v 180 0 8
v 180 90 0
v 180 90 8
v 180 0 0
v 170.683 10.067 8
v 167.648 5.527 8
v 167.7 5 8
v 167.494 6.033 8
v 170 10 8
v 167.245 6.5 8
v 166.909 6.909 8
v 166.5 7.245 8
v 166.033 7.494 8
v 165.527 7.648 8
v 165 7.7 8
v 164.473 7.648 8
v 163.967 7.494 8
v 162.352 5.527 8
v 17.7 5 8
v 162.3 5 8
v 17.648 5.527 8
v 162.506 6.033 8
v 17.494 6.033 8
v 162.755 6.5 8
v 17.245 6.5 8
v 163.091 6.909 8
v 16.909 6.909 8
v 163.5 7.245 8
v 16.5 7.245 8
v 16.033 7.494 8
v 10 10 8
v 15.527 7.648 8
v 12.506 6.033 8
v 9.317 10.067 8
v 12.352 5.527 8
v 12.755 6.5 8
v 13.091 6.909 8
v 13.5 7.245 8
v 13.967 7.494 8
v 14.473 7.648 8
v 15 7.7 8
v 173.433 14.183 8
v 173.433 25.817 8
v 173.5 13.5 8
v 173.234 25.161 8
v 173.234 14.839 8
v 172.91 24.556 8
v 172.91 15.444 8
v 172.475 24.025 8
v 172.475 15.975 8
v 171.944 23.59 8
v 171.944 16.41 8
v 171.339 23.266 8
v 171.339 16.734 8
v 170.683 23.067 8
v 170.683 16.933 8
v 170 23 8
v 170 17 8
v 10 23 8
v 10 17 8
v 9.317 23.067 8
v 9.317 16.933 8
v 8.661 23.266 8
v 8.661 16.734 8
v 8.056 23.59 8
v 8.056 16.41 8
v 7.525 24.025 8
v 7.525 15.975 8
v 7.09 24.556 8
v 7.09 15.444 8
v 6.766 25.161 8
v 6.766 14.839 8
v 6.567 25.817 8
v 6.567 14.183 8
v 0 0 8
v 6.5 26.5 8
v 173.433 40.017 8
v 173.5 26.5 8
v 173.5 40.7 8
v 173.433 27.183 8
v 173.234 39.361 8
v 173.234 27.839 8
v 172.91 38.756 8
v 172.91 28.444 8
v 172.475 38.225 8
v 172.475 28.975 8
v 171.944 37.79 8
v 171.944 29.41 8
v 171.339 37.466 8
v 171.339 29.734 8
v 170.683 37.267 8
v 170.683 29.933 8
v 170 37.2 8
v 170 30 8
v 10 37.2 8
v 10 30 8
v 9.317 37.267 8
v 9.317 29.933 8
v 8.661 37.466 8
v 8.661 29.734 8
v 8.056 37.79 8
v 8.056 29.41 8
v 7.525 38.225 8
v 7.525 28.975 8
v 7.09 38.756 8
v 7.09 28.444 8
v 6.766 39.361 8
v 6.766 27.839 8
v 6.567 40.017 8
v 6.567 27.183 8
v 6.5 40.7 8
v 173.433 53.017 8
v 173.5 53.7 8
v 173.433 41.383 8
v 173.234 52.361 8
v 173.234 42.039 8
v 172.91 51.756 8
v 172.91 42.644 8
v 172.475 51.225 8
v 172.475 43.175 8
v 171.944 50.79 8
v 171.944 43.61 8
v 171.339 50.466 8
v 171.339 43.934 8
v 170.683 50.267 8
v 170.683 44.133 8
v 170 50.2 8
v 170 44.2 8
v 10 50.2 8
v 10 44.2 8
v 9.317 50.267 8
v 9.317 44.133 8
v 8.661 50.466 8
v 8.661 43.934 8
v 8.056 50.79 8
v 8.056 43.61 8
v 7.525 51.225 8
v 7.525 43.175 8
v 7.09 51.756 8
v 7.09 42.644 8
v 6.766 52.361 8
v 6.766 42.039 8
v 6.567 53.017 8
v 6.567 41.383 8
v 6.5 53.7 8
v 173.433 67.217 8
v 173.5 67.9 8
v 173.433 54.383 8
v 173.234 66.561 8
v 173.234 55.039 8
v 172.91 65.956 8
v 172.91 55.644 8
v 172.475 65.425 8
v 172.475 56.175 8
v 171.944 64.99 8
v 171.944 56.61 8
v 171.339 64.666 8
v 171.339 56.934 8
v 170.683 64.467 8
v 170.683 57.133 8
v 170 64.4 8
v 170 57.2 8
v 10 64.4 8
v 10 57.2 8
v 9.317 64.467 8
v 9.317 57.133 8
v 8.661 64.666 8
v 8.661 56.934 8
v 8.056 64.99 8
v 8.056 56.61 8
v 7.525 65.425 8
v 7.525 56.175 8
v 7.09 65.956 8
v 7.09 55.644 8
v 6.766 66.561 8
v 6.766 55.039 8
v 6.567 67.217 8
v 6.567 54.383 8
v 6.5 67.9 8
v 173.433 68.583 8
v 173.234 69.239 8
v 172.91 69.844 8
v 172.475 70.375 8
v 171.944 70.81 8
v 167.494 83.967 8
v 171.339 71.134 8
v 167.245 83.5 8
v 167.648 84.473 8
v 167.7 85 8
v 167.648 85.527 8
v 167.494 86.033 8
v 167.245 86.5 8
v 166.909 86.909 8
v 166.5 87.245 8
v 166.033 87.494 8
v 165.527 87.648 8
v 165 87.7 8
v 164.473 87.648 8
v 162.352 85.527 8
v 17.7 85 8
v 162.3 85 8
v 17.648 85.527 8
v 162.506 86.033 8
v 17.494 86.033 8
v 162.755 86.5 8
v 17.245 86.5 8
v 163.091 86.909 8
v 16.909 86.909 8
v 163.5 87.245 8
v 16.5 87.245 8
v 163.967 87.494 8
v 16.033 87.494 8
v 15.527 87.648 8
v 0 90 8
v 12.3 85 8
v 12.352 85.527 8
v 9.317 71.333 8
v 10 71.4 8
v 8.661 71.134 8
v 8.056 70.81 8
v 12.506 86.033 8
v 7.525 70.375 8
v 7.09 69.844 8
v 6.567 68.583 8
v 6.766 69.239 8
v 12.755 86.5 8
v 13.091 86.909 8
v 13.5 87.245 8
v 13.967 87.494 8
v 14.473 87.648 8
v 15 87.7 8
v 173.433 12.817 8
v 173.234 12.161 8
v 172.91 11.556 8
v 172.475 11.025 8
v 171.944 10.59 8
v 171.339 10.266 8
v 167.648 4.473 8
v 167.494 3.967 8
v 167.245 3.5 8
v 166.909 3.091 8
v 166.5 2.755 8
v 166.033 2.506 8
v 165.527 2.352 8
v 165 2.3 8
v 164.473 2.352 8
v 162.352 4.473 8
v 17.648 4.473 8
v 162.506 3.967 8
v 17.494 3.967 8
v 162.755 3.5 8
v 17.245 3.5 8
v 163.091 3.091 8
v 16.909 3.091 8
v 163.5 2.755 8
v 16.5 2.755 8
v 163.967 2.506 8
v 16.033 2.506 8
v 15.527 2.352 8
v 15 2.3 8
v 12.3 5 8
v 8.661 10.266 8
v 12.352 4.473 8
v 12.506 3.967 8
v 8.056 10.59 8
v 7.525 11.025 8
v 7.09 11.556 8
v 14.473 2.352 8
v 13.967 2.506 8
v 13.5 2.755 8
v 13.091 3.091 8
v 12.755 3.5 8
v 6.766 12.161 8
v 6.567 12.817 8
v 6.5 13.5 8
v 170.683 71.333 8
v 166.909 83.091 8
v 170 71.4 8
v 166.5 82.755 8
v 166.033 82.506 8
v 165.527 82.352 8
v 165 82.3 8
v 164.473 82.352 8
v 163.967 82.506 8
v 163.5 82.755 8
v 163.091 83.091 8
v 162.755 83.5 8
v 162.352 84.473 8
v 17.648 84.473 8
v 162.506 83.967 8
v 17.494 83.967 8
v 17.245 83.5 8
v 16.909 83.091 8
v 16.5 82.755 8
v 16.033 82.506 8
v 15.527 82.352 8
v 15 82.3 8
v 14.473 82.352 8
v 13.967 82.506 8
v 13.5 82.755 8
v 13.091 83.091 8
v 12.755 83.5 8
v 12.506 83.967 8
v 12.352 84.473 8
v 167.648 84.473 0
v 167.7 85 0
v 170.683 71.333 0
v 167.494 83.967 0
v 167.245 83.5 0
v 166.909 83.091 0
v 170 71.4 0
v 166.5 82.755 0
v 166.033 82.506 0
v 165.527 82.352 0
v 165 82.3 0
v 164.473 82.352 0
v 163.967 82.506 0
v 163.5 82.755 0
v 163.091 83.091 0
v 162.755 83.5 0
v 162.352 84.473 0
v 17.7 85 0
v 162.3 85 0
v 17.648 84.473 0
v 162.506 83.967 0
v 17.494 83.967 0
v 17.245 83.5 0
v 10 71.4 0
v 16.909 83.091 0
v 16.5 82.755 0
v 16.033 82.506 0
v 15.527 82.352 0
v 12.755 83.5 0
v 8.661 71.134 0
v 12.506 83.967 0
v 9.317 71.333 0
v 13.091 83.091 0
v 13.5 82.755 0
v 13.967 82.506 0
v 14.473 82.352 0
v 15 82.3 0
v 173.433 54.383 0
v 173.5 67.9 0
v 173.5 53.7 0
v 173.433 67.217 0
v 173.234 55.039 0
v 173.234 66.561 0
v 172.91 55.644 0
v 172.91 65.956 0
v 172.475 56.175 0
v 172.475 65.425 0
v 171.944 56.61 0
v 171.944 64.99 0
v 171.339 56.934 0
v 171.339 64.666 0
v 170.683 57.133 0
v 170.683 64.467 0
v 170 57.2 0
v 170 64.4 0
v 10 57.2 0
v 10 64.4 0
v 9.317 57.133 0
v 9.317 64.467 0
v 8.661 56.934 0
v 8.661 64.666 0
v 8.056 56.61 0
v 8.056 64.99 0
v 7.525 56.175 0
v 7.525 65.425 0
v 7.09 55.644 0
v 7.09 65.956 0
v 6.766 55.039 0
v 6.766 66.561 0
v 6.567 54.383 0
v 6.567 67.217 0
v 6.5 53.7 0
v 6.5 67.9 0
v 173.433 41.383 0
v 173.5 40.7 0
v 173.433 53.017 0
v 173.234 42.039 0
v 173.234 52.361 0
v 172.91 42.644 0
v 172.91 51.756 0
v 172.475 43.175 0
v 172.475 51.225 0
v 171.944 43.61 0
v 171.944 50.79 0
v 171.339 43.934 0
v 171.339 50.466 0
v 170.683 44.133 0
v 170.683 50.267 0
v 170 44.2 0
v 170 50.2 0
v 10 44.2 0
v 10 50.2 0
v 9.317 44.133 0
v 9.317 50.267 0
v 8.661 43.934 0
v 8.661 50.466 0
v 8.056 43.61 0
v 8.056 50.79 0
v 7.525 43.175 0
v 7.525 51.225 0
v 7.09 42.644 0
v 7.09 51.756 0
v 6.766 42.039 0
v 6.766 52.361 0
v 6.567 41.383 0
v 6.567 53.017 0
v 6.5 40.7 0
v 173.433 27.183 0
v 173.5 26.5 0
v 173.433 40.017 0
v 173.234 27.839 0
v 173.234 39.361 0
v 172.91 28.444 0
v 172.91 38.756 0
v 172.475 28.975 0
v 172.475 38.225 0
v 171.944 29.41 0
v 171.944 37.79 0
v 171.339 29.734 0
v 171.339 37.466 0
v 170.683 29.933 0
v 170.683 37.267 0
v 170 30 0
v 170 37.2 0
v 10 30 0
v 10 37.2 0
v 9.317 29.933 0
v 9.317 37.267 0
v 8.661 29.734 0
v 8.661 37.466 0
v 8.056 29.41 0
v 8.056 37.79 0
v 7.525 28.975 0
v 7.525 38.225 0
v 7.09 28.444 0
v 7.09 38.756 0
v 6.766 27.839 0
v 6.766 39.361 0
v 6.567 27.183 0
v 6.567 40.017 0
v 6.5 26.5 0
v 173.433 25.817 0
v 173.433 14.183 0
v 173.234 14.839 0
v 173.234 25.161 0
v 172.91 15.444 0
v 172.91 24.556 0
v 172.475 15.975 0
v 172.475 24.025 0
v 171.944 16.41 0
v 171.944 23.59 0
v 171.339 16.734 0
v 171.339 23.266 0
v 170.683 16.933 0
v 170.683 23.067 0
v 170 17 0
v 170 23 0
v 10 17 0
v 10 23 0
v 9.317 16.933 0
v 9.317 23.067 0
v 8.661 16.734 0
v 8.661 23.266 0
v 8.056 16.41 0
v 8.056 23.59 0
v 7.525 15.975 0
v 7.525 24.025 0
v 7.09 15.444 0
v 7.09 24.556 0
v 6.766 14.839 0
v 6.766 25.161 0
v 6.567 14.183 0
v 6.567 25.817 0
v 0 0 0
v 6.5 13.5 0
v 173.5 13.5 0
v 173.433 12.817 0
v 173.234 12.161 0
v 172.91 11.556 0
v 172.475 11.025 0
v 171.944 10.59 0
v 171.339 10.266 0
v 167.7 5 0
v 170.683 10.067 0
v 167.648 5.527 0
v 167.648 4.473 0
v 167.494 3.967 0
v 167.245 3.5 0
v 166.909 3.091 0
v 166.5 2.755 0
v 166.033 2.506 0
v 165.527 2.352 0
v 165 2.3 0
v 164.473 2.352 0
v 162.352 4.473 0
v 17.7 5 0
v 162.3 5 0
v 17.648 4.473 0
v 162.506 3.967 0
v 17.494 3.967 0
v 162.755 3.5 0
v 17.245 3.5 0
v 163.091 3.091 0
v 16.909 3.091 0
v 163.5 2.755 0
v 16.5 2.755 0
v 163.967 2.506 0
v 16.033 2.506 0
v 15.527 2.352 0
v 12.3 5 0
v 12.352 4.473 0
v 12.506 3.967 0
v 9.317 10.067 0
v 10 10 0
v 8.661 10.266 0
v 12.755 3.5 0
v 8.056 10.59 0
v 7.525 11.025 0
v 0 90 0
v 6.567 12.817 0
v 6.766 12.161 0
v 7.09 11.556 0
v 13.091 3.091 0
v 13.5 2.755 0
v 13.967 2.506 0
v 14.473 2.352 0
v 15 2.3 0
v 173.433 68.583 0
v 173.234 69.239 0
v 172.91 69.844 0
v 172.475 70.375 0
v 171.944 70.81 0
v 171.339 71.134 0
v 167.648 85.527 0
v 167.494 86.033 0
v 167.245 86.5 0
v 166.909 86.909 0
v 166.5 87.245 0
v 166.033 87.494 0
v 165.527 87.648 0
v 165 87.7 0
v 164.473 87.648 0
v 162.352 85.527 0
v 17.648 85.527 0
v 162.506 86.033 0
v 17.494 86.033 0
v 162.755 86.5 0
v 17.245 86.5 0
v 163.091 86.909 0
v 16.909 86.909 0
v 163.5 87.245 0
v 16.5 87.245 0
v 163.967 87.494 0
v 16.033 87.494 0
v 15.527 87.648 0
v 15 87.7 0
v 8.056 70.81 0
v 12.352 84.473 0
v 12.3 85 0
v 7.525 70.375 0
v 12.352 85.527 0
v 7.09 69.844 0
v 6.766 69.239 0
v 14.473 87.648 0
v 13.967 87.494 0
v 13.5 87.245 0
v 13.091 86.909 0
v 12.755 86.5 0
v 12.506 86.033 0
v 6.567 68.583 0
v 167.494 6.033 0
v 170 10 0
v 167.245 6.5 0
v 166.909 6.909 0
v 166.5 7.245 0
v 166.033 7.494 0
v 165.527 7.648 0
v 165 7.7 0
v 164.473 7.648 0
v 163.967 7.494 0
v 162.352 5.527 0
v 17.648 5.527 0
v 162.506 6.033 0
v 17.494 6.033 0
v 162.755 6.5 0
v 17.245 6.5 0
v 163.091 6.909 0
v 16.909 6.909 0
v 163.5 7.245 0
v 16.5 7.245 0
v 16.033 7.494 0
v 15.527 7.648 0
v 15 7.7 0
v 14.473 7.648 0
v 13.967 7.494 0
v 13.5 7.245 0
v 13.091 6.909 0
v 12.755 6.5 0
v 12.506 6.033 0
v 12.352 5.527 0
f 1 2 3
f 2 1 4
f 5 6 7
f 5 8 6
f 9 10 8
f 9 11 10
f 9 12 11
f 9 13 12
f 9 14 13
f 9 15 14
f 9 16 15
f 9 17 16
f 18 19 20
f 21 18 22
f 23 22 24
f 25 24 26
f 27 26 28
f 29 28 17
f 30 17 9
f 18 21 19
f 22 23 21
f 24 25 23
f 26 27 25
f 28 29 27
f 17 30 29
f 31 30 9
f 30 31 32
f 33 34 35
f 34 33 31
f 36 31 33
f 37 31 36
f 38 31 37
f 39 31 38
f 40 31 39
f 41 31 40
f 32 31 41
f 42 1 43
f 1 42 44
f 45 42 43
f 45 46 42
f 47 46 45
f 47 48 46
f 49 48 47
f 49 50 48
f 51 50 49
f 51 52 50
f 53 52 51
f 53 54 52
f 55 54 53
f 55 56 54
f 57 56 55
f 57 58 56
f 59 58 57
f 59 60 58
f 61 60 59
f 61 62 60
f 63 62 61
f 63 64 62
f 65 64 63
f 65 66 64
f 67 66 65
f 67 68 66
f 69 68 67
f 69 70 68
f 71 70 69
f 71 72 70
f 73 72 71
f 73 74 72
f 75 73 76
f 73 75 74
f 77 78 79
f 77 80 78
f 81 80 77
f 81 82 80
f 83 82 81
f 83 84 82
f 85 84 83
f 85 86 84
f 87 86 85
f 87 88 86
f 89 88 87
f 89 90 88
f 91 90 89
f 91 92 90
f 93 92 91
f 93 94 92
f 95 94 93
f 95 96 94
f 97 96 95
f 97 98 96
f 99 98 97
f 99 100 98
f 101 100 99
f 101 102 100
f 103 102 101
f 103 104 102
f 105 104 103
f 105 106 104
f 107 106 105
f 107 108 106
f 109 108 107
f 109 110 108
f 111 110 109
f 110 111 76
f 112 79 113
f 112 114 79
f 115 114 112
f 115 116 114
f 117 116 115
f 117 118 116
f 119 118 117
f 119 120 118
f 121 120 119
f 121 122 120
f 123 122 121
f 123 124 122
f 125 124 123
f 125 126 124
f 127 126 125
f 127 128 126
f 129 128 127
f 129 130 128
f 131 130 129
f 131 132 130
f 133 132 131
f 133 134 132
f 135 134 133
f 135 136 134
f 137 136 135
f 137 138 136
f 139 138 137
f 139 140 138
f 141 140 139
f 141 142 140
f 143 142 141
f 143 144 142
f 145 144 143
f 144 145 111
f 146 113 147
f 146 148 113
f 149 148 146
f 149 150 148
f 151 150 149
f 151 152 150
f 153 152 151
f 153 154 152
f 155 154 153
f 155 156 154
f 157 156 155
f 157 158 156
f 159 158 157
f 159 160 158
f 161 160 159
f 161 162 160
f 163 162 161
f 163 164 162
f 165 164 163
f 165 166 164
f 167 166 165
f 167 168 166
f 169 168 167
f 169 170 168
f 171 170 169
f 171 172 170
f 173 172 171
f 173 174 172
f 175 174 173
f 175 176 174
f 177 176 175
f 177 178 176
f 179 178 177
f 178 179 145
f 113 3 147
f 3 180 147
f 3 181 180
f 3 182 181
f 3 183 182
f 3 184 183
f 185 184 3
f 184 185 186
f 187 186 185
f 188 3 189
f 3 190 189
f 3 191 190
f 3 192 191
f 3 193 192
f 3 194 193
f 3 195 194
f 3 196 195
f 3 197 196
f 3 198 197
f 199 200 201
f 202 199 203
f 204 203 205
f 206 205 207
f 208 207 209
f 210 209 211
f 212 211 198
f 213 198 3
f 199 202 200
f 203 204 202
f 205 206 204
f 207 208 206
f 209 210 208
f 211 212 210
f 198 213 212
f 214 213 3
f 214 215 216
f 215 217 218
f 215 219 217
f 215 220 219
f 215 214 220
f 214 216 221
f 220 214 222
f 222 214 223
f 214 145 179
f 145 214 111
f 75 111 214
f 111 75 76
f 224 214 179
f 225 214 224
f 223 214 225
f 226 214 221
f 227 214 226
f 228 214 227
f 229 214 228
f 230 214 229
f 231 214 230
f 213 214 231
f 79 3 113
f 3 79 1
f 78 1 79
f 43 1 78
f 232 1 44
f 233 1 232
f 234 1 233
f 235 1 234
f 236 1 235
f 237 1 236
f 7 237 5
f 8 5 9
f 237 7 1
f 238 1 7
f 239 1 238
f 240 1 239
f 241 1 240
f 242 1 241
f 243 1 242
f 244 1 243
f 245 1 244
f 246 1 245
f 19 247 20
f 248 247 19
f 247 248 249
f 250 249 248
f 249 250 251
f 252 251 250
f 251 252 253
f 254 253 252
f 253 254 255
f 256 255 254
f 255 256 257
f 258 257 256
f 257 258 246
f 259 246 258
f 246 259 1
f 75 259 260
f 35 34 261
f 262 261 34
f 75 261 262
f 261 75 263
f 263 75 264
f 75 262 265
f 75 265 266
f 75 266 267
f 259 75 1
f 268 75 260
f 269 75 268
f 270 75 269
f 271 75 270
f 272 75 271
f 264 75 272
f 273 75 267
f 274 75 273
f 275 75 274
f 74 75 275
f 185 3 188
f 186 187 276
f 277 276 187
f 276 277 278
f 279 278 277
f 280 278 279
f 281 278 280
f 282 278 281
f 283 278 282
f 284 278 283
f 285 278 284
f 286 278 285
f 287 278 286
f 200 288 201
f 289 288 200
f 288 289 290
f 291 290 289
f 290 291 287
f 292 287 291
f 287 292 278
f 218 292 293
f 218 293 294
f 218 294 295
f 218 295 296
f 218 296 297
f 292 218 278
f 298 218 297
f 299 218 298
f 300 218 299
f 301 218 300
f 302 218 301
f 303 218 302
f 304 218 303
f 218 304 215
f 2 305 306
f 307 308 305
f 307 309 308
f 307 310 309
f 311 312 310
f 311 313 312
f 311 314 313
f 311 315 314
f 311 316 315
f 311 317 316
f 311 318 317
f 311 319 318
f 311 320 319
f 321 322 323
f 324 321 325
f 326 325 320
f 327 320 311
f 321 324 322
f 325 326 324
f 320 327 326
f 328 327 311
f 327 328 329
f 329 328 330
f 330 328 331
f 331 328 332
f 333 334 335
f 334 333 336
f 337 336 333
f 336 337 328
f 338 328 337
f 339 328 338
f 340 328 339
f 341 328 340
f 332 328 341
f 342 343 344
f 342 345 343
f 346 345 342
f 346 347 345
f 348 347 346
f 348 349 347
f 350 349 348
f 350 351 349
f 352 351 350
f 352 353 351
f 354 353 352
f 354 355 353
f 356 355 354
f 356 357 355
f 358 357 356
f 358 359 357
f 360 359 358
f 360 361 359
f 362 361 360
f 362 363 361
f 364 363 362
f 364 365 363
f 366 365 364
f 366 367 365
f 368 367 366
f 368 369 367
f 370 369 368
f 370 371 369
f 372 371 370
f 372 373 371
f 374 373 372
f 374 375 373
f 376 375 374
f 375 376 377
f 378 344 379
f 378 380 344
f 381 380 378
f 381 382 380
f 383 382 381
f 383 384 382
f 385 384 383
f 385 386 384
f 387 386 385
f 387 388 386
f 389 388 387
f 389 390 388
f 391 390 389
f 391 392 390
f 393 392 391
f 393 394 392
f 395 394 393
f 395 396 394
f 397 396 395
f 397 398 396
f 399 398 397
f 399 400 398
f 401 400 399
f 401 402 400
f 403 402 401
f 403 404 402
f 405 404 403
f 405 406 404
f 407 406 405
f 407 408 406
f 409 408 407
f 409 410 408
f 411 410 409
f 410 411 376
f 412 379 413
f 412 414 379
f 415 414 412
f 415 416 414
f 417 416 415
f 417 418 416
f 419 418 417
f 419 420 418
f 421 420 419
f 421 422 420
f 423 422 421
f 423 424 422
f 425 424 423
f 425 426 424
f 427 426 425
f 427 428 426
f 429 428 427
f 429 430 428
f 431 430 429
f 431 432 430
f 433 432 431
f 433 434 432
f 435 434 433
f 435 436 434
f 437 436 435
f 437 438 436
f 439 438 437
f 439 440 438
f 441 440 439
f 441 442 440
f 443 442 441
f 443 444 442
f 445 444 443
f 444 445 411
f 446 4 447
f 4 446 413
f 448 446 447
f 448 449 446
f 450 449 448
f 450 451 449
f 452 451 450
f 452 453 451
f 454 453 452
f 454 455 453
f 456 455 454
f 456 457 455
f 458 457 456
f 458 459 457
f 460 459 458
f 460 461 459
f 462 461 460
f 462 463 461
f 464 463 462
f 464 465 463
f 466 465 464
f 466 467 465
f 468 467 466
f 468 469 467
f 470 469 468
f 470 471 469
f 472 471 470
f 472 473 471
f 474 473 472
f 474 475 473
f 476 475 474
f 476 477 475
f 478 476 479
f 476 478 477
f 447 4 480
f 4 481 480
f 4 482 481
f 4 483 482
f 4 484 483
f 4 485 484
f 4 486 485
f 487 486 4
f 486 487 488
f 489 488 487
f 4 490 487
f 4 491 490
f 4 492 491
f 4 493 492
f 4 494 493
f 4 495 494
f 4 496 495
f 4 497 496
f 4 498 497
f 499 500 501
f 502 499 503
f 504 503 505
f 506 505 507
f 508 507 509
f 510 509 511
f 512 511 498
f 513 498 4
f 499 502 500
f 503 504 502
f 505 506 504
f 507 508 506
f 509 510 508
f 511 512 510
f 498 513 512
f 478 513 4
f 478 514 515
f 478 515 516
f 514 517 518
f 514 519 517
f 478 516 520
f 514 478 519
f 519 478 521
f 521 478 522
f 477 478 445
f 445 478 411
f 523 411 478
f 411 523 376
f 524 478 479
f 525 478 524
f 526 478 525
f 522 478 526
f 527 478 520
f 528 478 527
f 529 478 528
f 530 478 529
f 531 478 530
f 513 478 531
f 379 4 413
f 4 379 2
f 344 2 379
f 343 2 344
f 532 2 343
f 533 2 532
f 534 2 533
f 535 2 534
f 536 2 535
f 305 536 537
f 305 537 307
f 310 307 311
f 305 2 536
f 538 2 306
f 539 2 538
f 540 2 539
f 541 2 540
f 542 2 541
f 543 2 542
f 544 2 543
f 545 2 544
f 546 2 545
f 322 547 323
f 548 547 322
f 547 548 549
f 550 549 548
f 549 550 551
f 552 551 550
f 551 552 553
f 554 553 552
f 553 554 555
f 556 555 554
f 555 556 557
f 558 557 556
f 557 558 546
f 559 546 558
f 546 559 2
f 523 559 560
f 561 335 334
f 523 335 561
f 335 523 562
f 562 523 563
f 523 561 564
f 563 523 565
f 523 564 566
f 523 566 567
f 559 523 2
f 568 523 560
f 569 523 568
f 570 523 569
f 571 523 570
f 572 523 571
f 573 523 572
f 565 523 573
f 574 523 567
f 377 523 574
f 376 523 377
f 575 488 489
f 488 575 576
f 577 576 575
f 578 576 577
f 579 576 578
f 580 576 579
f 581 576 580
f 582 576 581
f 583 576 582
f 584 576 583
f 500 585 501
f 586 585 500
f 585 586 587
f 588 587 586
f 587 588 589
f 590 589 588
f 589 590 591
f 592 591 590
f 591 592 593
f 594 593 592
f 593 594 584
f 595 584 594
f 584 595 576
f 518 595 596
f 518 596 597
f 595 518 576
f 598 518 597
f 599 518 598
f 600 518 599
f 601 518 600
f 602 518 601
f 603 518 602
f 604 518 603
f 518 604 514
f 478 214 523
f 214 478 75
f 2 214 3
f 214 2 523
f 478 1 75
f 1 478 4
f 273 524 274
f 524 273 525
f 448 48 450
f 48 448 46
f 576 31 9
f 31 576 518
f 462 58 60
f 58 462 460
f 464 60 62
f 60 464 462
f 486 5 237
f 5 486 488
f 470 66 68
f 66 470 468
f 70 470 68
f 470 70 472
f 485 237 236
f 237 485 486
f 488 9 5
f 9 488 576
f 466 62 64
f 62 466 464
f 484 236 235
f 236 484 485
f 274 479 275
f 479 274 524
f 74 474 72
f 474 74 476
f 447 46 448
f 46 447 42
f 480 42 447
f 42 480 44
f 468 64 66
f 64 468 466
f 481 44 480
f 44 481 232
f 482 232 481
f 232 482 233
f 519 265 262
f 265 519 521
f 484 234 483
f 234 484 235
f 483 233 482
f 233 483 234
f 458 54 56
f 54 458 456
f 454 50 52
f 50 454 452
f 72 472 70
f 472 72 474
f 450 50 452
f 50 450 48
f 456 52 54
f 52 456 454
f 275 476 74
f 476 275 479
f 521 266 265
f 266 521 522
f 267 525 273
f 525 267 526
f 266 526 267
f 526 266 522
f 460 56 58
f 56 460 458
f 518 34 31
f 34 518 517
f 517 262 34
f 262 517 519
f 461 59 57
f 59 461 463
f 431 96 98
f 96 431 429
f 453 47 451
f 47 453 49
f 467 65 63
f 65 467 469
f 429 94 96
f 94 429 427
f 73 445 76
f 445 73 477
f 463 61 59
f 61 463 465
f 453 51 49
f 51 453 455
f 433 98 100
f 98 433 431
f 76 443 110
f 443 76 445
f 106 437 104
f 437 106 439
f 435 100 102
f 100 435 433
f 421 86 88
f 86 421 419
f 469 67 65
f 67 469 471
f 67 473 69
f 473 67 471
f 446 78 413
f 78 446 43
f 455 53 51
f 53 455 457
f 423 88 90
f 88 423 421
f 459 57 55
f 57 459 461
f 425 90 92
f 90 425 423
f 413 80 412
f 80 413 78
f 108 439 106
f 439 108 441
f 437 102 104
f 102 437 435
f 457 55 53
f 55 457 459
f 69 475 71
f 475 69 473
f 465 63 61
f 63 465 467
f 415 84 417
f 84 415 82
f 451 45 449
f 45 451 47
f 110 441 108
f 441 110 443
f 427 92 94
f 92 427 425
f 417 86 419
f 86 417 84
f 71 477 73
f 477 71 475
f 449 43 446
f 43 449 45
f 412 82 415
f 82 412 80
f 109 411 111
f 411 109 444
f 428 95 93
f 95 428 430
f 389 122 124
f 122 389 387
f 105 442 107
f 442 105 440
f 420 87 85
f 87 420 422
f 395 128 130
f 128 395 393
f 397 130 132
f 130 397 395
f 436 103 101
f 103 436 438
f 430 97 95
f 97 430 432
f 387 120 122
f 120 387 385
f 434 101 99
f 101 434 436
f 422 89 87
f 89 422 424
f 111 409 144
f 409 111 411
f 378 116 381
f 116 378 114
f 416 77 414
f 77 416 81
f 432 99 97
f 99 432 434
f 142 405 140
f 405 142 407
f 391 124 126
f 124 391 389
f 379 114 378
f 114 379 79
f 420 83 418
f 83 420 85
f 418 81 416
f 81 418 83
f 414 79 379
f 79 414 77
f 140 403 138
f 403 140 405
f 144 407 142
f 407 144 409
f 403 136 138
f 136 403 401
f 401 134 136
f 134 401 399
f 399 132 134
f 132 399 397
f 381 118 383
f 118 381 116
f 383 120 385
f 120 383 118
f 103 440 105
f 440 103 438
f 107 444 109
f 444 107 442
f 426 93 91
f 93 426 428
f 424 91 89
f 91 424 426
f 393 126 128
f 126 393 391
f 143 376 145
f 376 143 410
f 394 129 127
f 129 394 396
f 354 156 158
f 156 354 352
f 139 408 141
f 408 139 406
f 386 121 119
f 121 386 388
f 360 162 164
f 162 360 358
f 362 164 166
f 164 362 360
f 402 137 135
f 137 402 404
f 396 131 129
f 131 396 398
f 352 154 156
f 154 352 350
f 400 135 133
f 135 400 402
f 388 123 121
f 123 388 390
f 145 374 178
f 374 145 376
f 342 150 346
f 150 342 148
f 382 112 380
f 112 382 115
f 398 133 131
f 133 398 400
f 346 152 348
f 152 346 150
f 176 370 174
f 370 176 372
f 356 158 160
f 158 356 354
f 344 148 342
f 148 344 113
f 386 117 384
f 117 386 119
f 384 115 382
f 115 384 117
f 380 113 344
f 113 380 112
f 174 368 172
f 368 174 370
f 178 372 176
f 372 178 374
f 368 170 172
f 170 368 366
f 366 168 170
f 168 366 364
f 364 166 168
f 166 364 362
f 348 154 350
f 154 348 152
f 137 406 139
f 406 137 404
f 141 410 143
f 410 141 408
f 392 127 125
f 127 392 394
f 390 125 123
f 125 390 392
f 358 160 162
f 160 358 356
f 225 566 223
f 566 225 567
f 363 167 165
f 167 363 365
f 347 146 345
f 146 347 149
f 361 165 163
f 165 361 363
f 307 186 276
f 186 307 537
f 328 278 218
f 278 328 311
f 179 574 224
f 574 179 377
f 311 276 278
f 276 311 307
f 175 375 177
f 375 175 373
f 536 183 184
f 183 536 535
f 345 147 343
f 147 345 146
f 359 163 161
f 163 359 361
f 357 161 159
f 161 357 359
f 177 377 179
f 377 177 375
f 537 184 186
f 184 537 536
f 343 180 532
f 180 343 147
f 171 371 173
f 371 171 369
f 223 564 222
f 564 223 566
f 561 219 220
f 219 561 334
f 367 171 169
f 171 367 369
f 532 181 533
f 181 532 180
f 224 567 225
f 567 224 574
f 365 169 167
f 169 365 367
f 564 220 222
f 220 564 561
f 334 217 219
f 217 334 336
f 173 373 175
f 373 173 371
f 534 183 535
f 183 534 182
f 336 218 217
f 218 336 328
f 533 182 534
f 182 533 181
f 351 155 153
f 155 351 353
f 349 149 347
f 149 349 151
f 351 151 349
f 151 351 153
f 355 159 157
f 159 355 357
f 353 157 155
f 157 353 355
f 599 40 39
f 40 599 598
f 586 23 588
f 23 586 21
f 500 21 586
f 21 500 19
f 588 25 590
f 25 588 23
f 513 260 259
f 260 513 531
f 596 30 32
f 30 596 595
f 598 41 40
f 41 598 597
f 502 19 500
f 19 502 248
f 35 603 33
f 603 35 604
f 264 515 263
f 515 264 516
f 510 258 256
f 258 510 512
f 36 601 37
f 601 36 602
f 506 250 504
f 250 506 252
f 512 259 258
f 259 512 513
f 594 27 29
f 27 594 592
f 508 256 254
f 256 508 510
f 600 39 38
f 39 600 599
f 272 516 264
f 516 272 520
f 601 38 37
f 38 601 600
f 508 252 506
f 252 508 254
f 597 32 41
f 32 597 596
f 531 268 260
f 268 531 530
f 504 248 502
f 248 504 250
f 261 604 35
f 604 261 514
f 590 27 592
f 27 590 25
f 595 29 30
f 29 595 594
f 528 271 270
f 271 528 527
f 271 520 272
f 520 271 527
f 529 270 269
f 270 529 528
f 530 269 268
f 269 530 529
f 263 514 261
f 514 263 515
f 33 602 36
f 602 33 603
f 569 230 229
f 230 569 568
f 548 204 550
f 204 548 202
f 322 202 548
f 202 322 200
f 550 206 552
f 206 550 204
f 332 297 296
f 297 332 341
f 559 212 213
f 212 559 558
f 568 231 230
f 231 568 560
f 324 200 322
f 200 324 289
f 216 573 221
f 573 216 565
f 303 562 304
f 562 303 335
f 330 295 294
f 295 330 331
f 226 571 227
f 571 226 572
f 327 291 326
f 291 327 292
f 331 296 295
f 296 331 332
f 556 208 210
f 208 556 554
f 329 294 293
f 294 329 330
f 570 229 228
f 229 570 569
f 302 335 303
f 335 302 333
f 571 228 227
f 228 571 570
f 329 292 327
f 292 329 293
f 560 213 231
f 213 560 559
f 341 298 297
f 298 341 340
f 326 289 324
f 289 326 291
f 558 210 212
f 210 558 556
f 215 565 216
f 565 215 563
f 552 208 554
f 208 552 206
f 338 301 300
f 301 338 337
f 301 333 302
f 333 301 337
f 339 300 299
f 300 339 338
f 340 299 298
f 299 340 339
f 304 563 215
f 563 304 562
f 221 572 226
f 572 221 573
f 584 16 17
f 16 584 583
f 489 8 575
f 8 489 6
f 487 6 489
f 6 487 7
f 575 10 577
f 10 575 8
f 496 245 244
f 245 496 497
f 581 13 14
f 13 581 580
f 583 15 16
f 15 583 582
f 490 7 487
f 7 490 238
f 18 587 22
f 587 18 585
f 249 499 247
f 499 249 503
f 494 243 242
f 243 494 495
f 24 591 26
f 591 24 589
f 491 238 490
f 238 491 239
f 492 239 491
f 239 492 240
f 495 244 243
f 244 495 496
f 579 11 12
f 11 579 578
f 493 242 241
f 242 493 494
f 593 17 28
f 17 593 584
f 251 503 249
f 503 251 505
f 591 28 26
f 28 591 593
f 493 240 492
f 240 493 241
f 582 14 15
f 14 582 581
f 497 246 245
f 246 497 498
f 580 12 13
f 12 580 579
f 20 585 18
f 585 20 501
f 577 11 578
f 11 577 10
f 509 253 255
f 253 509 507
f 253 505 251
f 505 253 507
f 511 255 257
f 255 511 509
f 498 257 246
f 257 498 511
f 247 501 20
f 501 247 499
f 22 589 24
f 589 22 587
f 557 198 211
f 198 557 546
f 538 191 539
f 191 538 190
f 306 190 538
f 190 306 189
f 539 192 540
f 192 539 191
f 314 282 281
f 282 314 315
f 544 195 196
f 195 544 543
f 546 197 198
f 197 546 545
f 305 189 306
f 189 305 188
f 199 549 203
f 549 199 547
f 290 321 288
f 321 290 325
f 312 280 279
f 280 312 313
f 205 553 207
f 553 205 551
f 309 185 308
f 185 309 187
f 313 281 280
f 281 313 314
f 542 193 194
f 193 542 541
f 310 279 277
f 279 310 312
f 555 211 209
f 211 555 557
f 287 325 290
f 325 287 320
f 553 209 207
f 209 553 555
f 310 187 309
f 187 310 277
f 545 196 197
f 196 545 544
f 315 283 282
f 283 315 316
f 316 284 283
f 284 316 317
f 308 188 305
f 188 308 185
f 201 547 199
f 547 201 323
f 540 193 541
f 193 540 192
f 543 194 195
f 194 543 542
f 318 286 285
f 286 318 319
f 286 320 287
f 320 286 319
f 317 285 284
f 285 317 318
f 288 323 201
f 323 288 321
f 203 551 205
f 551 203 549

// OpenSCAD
$fn = 32;

// ----------------------------------------------------------------------
// Slotted panel: 180 x 90 mm, 5 рядов of slots
// ----------------------------------------------------------------------

// --- parameters (mm) ---
panel_w = 180;            // panel width
panel_d = 90;             // panel depth
thick = 8;                // panel thickness
slot_w = 7;               // slot width
pitch0 = 13;              // first row pitch
pitch_step = 1.2;         // pitch increase per row
margin = 10;              // margin around the slot field
rows = 5;                 // number of slot rows
mount_d = 5.4;            // mounting holes
mount_x = 75;             // mounting hole offset

difference() {
  union() {
    cube([panel_w, panel_d, thick]);
  }
  /* slot rows: stadium shaped cutters, 2.5 mm clear of both faces */
  /* row 0: pitch 13, length 160 */
  hull() {
    translate([10, 13.5, -2.5]) cylinder(h = thick + 5, d = slot_w);
    translate([170, 13.5, -2.5]) cylinder(h = thick + 5, d = slot_w);
  }
  /* row 1: pitch 14.2, length 160 */
  hull() {
    translate([10, 26.5, -2.5]) cylinder(h = thick + 5, d = slot_w);
    translate([170, 26.5, -2.5]) cylinder(h = thick + 5, d = slot_w);
  }
  /* row 2: pitch 13, length 160 */
  hull() {
    translate([10, 40.7, -2.5]) cylinder(h = thick + 5, d = slot_w);
    translate([170, 40.7, -2.5]) cylinder(h = thick + 5, d = slot_w);
  }
  /* row 3: pitch 14.2, length 160 */
  hull() {
    translate([10, 53.7, -2.5]) cylinder(h = thick + 5, d = slot_w);
    translate([170, 53.7, -2.5]) cylinder(h = thick + 5, d = slot_w);
  }
  /* row 4: pitch 13, length 160 */
  hull() {
    translate([10, 67.9, -2.5]) cylinder(h = thick + 5, d = slot_w);
    translate([170, 67.9, -2.5]) cylinder(h = thick + 5, d = slot_w);
  }
  translate([15, 5, -2.5]) cylinder(h = 13, d = mount_d);
  translate([15, 85, -2.5]) cylinder(h = 13, d = mount_d);
  translate([165, 5, -2.5]) cylinder(h = 13, d = mount_d);
  translate([165, 85, -2.5]) cylinder(h = 13, d = mount_d);
}
